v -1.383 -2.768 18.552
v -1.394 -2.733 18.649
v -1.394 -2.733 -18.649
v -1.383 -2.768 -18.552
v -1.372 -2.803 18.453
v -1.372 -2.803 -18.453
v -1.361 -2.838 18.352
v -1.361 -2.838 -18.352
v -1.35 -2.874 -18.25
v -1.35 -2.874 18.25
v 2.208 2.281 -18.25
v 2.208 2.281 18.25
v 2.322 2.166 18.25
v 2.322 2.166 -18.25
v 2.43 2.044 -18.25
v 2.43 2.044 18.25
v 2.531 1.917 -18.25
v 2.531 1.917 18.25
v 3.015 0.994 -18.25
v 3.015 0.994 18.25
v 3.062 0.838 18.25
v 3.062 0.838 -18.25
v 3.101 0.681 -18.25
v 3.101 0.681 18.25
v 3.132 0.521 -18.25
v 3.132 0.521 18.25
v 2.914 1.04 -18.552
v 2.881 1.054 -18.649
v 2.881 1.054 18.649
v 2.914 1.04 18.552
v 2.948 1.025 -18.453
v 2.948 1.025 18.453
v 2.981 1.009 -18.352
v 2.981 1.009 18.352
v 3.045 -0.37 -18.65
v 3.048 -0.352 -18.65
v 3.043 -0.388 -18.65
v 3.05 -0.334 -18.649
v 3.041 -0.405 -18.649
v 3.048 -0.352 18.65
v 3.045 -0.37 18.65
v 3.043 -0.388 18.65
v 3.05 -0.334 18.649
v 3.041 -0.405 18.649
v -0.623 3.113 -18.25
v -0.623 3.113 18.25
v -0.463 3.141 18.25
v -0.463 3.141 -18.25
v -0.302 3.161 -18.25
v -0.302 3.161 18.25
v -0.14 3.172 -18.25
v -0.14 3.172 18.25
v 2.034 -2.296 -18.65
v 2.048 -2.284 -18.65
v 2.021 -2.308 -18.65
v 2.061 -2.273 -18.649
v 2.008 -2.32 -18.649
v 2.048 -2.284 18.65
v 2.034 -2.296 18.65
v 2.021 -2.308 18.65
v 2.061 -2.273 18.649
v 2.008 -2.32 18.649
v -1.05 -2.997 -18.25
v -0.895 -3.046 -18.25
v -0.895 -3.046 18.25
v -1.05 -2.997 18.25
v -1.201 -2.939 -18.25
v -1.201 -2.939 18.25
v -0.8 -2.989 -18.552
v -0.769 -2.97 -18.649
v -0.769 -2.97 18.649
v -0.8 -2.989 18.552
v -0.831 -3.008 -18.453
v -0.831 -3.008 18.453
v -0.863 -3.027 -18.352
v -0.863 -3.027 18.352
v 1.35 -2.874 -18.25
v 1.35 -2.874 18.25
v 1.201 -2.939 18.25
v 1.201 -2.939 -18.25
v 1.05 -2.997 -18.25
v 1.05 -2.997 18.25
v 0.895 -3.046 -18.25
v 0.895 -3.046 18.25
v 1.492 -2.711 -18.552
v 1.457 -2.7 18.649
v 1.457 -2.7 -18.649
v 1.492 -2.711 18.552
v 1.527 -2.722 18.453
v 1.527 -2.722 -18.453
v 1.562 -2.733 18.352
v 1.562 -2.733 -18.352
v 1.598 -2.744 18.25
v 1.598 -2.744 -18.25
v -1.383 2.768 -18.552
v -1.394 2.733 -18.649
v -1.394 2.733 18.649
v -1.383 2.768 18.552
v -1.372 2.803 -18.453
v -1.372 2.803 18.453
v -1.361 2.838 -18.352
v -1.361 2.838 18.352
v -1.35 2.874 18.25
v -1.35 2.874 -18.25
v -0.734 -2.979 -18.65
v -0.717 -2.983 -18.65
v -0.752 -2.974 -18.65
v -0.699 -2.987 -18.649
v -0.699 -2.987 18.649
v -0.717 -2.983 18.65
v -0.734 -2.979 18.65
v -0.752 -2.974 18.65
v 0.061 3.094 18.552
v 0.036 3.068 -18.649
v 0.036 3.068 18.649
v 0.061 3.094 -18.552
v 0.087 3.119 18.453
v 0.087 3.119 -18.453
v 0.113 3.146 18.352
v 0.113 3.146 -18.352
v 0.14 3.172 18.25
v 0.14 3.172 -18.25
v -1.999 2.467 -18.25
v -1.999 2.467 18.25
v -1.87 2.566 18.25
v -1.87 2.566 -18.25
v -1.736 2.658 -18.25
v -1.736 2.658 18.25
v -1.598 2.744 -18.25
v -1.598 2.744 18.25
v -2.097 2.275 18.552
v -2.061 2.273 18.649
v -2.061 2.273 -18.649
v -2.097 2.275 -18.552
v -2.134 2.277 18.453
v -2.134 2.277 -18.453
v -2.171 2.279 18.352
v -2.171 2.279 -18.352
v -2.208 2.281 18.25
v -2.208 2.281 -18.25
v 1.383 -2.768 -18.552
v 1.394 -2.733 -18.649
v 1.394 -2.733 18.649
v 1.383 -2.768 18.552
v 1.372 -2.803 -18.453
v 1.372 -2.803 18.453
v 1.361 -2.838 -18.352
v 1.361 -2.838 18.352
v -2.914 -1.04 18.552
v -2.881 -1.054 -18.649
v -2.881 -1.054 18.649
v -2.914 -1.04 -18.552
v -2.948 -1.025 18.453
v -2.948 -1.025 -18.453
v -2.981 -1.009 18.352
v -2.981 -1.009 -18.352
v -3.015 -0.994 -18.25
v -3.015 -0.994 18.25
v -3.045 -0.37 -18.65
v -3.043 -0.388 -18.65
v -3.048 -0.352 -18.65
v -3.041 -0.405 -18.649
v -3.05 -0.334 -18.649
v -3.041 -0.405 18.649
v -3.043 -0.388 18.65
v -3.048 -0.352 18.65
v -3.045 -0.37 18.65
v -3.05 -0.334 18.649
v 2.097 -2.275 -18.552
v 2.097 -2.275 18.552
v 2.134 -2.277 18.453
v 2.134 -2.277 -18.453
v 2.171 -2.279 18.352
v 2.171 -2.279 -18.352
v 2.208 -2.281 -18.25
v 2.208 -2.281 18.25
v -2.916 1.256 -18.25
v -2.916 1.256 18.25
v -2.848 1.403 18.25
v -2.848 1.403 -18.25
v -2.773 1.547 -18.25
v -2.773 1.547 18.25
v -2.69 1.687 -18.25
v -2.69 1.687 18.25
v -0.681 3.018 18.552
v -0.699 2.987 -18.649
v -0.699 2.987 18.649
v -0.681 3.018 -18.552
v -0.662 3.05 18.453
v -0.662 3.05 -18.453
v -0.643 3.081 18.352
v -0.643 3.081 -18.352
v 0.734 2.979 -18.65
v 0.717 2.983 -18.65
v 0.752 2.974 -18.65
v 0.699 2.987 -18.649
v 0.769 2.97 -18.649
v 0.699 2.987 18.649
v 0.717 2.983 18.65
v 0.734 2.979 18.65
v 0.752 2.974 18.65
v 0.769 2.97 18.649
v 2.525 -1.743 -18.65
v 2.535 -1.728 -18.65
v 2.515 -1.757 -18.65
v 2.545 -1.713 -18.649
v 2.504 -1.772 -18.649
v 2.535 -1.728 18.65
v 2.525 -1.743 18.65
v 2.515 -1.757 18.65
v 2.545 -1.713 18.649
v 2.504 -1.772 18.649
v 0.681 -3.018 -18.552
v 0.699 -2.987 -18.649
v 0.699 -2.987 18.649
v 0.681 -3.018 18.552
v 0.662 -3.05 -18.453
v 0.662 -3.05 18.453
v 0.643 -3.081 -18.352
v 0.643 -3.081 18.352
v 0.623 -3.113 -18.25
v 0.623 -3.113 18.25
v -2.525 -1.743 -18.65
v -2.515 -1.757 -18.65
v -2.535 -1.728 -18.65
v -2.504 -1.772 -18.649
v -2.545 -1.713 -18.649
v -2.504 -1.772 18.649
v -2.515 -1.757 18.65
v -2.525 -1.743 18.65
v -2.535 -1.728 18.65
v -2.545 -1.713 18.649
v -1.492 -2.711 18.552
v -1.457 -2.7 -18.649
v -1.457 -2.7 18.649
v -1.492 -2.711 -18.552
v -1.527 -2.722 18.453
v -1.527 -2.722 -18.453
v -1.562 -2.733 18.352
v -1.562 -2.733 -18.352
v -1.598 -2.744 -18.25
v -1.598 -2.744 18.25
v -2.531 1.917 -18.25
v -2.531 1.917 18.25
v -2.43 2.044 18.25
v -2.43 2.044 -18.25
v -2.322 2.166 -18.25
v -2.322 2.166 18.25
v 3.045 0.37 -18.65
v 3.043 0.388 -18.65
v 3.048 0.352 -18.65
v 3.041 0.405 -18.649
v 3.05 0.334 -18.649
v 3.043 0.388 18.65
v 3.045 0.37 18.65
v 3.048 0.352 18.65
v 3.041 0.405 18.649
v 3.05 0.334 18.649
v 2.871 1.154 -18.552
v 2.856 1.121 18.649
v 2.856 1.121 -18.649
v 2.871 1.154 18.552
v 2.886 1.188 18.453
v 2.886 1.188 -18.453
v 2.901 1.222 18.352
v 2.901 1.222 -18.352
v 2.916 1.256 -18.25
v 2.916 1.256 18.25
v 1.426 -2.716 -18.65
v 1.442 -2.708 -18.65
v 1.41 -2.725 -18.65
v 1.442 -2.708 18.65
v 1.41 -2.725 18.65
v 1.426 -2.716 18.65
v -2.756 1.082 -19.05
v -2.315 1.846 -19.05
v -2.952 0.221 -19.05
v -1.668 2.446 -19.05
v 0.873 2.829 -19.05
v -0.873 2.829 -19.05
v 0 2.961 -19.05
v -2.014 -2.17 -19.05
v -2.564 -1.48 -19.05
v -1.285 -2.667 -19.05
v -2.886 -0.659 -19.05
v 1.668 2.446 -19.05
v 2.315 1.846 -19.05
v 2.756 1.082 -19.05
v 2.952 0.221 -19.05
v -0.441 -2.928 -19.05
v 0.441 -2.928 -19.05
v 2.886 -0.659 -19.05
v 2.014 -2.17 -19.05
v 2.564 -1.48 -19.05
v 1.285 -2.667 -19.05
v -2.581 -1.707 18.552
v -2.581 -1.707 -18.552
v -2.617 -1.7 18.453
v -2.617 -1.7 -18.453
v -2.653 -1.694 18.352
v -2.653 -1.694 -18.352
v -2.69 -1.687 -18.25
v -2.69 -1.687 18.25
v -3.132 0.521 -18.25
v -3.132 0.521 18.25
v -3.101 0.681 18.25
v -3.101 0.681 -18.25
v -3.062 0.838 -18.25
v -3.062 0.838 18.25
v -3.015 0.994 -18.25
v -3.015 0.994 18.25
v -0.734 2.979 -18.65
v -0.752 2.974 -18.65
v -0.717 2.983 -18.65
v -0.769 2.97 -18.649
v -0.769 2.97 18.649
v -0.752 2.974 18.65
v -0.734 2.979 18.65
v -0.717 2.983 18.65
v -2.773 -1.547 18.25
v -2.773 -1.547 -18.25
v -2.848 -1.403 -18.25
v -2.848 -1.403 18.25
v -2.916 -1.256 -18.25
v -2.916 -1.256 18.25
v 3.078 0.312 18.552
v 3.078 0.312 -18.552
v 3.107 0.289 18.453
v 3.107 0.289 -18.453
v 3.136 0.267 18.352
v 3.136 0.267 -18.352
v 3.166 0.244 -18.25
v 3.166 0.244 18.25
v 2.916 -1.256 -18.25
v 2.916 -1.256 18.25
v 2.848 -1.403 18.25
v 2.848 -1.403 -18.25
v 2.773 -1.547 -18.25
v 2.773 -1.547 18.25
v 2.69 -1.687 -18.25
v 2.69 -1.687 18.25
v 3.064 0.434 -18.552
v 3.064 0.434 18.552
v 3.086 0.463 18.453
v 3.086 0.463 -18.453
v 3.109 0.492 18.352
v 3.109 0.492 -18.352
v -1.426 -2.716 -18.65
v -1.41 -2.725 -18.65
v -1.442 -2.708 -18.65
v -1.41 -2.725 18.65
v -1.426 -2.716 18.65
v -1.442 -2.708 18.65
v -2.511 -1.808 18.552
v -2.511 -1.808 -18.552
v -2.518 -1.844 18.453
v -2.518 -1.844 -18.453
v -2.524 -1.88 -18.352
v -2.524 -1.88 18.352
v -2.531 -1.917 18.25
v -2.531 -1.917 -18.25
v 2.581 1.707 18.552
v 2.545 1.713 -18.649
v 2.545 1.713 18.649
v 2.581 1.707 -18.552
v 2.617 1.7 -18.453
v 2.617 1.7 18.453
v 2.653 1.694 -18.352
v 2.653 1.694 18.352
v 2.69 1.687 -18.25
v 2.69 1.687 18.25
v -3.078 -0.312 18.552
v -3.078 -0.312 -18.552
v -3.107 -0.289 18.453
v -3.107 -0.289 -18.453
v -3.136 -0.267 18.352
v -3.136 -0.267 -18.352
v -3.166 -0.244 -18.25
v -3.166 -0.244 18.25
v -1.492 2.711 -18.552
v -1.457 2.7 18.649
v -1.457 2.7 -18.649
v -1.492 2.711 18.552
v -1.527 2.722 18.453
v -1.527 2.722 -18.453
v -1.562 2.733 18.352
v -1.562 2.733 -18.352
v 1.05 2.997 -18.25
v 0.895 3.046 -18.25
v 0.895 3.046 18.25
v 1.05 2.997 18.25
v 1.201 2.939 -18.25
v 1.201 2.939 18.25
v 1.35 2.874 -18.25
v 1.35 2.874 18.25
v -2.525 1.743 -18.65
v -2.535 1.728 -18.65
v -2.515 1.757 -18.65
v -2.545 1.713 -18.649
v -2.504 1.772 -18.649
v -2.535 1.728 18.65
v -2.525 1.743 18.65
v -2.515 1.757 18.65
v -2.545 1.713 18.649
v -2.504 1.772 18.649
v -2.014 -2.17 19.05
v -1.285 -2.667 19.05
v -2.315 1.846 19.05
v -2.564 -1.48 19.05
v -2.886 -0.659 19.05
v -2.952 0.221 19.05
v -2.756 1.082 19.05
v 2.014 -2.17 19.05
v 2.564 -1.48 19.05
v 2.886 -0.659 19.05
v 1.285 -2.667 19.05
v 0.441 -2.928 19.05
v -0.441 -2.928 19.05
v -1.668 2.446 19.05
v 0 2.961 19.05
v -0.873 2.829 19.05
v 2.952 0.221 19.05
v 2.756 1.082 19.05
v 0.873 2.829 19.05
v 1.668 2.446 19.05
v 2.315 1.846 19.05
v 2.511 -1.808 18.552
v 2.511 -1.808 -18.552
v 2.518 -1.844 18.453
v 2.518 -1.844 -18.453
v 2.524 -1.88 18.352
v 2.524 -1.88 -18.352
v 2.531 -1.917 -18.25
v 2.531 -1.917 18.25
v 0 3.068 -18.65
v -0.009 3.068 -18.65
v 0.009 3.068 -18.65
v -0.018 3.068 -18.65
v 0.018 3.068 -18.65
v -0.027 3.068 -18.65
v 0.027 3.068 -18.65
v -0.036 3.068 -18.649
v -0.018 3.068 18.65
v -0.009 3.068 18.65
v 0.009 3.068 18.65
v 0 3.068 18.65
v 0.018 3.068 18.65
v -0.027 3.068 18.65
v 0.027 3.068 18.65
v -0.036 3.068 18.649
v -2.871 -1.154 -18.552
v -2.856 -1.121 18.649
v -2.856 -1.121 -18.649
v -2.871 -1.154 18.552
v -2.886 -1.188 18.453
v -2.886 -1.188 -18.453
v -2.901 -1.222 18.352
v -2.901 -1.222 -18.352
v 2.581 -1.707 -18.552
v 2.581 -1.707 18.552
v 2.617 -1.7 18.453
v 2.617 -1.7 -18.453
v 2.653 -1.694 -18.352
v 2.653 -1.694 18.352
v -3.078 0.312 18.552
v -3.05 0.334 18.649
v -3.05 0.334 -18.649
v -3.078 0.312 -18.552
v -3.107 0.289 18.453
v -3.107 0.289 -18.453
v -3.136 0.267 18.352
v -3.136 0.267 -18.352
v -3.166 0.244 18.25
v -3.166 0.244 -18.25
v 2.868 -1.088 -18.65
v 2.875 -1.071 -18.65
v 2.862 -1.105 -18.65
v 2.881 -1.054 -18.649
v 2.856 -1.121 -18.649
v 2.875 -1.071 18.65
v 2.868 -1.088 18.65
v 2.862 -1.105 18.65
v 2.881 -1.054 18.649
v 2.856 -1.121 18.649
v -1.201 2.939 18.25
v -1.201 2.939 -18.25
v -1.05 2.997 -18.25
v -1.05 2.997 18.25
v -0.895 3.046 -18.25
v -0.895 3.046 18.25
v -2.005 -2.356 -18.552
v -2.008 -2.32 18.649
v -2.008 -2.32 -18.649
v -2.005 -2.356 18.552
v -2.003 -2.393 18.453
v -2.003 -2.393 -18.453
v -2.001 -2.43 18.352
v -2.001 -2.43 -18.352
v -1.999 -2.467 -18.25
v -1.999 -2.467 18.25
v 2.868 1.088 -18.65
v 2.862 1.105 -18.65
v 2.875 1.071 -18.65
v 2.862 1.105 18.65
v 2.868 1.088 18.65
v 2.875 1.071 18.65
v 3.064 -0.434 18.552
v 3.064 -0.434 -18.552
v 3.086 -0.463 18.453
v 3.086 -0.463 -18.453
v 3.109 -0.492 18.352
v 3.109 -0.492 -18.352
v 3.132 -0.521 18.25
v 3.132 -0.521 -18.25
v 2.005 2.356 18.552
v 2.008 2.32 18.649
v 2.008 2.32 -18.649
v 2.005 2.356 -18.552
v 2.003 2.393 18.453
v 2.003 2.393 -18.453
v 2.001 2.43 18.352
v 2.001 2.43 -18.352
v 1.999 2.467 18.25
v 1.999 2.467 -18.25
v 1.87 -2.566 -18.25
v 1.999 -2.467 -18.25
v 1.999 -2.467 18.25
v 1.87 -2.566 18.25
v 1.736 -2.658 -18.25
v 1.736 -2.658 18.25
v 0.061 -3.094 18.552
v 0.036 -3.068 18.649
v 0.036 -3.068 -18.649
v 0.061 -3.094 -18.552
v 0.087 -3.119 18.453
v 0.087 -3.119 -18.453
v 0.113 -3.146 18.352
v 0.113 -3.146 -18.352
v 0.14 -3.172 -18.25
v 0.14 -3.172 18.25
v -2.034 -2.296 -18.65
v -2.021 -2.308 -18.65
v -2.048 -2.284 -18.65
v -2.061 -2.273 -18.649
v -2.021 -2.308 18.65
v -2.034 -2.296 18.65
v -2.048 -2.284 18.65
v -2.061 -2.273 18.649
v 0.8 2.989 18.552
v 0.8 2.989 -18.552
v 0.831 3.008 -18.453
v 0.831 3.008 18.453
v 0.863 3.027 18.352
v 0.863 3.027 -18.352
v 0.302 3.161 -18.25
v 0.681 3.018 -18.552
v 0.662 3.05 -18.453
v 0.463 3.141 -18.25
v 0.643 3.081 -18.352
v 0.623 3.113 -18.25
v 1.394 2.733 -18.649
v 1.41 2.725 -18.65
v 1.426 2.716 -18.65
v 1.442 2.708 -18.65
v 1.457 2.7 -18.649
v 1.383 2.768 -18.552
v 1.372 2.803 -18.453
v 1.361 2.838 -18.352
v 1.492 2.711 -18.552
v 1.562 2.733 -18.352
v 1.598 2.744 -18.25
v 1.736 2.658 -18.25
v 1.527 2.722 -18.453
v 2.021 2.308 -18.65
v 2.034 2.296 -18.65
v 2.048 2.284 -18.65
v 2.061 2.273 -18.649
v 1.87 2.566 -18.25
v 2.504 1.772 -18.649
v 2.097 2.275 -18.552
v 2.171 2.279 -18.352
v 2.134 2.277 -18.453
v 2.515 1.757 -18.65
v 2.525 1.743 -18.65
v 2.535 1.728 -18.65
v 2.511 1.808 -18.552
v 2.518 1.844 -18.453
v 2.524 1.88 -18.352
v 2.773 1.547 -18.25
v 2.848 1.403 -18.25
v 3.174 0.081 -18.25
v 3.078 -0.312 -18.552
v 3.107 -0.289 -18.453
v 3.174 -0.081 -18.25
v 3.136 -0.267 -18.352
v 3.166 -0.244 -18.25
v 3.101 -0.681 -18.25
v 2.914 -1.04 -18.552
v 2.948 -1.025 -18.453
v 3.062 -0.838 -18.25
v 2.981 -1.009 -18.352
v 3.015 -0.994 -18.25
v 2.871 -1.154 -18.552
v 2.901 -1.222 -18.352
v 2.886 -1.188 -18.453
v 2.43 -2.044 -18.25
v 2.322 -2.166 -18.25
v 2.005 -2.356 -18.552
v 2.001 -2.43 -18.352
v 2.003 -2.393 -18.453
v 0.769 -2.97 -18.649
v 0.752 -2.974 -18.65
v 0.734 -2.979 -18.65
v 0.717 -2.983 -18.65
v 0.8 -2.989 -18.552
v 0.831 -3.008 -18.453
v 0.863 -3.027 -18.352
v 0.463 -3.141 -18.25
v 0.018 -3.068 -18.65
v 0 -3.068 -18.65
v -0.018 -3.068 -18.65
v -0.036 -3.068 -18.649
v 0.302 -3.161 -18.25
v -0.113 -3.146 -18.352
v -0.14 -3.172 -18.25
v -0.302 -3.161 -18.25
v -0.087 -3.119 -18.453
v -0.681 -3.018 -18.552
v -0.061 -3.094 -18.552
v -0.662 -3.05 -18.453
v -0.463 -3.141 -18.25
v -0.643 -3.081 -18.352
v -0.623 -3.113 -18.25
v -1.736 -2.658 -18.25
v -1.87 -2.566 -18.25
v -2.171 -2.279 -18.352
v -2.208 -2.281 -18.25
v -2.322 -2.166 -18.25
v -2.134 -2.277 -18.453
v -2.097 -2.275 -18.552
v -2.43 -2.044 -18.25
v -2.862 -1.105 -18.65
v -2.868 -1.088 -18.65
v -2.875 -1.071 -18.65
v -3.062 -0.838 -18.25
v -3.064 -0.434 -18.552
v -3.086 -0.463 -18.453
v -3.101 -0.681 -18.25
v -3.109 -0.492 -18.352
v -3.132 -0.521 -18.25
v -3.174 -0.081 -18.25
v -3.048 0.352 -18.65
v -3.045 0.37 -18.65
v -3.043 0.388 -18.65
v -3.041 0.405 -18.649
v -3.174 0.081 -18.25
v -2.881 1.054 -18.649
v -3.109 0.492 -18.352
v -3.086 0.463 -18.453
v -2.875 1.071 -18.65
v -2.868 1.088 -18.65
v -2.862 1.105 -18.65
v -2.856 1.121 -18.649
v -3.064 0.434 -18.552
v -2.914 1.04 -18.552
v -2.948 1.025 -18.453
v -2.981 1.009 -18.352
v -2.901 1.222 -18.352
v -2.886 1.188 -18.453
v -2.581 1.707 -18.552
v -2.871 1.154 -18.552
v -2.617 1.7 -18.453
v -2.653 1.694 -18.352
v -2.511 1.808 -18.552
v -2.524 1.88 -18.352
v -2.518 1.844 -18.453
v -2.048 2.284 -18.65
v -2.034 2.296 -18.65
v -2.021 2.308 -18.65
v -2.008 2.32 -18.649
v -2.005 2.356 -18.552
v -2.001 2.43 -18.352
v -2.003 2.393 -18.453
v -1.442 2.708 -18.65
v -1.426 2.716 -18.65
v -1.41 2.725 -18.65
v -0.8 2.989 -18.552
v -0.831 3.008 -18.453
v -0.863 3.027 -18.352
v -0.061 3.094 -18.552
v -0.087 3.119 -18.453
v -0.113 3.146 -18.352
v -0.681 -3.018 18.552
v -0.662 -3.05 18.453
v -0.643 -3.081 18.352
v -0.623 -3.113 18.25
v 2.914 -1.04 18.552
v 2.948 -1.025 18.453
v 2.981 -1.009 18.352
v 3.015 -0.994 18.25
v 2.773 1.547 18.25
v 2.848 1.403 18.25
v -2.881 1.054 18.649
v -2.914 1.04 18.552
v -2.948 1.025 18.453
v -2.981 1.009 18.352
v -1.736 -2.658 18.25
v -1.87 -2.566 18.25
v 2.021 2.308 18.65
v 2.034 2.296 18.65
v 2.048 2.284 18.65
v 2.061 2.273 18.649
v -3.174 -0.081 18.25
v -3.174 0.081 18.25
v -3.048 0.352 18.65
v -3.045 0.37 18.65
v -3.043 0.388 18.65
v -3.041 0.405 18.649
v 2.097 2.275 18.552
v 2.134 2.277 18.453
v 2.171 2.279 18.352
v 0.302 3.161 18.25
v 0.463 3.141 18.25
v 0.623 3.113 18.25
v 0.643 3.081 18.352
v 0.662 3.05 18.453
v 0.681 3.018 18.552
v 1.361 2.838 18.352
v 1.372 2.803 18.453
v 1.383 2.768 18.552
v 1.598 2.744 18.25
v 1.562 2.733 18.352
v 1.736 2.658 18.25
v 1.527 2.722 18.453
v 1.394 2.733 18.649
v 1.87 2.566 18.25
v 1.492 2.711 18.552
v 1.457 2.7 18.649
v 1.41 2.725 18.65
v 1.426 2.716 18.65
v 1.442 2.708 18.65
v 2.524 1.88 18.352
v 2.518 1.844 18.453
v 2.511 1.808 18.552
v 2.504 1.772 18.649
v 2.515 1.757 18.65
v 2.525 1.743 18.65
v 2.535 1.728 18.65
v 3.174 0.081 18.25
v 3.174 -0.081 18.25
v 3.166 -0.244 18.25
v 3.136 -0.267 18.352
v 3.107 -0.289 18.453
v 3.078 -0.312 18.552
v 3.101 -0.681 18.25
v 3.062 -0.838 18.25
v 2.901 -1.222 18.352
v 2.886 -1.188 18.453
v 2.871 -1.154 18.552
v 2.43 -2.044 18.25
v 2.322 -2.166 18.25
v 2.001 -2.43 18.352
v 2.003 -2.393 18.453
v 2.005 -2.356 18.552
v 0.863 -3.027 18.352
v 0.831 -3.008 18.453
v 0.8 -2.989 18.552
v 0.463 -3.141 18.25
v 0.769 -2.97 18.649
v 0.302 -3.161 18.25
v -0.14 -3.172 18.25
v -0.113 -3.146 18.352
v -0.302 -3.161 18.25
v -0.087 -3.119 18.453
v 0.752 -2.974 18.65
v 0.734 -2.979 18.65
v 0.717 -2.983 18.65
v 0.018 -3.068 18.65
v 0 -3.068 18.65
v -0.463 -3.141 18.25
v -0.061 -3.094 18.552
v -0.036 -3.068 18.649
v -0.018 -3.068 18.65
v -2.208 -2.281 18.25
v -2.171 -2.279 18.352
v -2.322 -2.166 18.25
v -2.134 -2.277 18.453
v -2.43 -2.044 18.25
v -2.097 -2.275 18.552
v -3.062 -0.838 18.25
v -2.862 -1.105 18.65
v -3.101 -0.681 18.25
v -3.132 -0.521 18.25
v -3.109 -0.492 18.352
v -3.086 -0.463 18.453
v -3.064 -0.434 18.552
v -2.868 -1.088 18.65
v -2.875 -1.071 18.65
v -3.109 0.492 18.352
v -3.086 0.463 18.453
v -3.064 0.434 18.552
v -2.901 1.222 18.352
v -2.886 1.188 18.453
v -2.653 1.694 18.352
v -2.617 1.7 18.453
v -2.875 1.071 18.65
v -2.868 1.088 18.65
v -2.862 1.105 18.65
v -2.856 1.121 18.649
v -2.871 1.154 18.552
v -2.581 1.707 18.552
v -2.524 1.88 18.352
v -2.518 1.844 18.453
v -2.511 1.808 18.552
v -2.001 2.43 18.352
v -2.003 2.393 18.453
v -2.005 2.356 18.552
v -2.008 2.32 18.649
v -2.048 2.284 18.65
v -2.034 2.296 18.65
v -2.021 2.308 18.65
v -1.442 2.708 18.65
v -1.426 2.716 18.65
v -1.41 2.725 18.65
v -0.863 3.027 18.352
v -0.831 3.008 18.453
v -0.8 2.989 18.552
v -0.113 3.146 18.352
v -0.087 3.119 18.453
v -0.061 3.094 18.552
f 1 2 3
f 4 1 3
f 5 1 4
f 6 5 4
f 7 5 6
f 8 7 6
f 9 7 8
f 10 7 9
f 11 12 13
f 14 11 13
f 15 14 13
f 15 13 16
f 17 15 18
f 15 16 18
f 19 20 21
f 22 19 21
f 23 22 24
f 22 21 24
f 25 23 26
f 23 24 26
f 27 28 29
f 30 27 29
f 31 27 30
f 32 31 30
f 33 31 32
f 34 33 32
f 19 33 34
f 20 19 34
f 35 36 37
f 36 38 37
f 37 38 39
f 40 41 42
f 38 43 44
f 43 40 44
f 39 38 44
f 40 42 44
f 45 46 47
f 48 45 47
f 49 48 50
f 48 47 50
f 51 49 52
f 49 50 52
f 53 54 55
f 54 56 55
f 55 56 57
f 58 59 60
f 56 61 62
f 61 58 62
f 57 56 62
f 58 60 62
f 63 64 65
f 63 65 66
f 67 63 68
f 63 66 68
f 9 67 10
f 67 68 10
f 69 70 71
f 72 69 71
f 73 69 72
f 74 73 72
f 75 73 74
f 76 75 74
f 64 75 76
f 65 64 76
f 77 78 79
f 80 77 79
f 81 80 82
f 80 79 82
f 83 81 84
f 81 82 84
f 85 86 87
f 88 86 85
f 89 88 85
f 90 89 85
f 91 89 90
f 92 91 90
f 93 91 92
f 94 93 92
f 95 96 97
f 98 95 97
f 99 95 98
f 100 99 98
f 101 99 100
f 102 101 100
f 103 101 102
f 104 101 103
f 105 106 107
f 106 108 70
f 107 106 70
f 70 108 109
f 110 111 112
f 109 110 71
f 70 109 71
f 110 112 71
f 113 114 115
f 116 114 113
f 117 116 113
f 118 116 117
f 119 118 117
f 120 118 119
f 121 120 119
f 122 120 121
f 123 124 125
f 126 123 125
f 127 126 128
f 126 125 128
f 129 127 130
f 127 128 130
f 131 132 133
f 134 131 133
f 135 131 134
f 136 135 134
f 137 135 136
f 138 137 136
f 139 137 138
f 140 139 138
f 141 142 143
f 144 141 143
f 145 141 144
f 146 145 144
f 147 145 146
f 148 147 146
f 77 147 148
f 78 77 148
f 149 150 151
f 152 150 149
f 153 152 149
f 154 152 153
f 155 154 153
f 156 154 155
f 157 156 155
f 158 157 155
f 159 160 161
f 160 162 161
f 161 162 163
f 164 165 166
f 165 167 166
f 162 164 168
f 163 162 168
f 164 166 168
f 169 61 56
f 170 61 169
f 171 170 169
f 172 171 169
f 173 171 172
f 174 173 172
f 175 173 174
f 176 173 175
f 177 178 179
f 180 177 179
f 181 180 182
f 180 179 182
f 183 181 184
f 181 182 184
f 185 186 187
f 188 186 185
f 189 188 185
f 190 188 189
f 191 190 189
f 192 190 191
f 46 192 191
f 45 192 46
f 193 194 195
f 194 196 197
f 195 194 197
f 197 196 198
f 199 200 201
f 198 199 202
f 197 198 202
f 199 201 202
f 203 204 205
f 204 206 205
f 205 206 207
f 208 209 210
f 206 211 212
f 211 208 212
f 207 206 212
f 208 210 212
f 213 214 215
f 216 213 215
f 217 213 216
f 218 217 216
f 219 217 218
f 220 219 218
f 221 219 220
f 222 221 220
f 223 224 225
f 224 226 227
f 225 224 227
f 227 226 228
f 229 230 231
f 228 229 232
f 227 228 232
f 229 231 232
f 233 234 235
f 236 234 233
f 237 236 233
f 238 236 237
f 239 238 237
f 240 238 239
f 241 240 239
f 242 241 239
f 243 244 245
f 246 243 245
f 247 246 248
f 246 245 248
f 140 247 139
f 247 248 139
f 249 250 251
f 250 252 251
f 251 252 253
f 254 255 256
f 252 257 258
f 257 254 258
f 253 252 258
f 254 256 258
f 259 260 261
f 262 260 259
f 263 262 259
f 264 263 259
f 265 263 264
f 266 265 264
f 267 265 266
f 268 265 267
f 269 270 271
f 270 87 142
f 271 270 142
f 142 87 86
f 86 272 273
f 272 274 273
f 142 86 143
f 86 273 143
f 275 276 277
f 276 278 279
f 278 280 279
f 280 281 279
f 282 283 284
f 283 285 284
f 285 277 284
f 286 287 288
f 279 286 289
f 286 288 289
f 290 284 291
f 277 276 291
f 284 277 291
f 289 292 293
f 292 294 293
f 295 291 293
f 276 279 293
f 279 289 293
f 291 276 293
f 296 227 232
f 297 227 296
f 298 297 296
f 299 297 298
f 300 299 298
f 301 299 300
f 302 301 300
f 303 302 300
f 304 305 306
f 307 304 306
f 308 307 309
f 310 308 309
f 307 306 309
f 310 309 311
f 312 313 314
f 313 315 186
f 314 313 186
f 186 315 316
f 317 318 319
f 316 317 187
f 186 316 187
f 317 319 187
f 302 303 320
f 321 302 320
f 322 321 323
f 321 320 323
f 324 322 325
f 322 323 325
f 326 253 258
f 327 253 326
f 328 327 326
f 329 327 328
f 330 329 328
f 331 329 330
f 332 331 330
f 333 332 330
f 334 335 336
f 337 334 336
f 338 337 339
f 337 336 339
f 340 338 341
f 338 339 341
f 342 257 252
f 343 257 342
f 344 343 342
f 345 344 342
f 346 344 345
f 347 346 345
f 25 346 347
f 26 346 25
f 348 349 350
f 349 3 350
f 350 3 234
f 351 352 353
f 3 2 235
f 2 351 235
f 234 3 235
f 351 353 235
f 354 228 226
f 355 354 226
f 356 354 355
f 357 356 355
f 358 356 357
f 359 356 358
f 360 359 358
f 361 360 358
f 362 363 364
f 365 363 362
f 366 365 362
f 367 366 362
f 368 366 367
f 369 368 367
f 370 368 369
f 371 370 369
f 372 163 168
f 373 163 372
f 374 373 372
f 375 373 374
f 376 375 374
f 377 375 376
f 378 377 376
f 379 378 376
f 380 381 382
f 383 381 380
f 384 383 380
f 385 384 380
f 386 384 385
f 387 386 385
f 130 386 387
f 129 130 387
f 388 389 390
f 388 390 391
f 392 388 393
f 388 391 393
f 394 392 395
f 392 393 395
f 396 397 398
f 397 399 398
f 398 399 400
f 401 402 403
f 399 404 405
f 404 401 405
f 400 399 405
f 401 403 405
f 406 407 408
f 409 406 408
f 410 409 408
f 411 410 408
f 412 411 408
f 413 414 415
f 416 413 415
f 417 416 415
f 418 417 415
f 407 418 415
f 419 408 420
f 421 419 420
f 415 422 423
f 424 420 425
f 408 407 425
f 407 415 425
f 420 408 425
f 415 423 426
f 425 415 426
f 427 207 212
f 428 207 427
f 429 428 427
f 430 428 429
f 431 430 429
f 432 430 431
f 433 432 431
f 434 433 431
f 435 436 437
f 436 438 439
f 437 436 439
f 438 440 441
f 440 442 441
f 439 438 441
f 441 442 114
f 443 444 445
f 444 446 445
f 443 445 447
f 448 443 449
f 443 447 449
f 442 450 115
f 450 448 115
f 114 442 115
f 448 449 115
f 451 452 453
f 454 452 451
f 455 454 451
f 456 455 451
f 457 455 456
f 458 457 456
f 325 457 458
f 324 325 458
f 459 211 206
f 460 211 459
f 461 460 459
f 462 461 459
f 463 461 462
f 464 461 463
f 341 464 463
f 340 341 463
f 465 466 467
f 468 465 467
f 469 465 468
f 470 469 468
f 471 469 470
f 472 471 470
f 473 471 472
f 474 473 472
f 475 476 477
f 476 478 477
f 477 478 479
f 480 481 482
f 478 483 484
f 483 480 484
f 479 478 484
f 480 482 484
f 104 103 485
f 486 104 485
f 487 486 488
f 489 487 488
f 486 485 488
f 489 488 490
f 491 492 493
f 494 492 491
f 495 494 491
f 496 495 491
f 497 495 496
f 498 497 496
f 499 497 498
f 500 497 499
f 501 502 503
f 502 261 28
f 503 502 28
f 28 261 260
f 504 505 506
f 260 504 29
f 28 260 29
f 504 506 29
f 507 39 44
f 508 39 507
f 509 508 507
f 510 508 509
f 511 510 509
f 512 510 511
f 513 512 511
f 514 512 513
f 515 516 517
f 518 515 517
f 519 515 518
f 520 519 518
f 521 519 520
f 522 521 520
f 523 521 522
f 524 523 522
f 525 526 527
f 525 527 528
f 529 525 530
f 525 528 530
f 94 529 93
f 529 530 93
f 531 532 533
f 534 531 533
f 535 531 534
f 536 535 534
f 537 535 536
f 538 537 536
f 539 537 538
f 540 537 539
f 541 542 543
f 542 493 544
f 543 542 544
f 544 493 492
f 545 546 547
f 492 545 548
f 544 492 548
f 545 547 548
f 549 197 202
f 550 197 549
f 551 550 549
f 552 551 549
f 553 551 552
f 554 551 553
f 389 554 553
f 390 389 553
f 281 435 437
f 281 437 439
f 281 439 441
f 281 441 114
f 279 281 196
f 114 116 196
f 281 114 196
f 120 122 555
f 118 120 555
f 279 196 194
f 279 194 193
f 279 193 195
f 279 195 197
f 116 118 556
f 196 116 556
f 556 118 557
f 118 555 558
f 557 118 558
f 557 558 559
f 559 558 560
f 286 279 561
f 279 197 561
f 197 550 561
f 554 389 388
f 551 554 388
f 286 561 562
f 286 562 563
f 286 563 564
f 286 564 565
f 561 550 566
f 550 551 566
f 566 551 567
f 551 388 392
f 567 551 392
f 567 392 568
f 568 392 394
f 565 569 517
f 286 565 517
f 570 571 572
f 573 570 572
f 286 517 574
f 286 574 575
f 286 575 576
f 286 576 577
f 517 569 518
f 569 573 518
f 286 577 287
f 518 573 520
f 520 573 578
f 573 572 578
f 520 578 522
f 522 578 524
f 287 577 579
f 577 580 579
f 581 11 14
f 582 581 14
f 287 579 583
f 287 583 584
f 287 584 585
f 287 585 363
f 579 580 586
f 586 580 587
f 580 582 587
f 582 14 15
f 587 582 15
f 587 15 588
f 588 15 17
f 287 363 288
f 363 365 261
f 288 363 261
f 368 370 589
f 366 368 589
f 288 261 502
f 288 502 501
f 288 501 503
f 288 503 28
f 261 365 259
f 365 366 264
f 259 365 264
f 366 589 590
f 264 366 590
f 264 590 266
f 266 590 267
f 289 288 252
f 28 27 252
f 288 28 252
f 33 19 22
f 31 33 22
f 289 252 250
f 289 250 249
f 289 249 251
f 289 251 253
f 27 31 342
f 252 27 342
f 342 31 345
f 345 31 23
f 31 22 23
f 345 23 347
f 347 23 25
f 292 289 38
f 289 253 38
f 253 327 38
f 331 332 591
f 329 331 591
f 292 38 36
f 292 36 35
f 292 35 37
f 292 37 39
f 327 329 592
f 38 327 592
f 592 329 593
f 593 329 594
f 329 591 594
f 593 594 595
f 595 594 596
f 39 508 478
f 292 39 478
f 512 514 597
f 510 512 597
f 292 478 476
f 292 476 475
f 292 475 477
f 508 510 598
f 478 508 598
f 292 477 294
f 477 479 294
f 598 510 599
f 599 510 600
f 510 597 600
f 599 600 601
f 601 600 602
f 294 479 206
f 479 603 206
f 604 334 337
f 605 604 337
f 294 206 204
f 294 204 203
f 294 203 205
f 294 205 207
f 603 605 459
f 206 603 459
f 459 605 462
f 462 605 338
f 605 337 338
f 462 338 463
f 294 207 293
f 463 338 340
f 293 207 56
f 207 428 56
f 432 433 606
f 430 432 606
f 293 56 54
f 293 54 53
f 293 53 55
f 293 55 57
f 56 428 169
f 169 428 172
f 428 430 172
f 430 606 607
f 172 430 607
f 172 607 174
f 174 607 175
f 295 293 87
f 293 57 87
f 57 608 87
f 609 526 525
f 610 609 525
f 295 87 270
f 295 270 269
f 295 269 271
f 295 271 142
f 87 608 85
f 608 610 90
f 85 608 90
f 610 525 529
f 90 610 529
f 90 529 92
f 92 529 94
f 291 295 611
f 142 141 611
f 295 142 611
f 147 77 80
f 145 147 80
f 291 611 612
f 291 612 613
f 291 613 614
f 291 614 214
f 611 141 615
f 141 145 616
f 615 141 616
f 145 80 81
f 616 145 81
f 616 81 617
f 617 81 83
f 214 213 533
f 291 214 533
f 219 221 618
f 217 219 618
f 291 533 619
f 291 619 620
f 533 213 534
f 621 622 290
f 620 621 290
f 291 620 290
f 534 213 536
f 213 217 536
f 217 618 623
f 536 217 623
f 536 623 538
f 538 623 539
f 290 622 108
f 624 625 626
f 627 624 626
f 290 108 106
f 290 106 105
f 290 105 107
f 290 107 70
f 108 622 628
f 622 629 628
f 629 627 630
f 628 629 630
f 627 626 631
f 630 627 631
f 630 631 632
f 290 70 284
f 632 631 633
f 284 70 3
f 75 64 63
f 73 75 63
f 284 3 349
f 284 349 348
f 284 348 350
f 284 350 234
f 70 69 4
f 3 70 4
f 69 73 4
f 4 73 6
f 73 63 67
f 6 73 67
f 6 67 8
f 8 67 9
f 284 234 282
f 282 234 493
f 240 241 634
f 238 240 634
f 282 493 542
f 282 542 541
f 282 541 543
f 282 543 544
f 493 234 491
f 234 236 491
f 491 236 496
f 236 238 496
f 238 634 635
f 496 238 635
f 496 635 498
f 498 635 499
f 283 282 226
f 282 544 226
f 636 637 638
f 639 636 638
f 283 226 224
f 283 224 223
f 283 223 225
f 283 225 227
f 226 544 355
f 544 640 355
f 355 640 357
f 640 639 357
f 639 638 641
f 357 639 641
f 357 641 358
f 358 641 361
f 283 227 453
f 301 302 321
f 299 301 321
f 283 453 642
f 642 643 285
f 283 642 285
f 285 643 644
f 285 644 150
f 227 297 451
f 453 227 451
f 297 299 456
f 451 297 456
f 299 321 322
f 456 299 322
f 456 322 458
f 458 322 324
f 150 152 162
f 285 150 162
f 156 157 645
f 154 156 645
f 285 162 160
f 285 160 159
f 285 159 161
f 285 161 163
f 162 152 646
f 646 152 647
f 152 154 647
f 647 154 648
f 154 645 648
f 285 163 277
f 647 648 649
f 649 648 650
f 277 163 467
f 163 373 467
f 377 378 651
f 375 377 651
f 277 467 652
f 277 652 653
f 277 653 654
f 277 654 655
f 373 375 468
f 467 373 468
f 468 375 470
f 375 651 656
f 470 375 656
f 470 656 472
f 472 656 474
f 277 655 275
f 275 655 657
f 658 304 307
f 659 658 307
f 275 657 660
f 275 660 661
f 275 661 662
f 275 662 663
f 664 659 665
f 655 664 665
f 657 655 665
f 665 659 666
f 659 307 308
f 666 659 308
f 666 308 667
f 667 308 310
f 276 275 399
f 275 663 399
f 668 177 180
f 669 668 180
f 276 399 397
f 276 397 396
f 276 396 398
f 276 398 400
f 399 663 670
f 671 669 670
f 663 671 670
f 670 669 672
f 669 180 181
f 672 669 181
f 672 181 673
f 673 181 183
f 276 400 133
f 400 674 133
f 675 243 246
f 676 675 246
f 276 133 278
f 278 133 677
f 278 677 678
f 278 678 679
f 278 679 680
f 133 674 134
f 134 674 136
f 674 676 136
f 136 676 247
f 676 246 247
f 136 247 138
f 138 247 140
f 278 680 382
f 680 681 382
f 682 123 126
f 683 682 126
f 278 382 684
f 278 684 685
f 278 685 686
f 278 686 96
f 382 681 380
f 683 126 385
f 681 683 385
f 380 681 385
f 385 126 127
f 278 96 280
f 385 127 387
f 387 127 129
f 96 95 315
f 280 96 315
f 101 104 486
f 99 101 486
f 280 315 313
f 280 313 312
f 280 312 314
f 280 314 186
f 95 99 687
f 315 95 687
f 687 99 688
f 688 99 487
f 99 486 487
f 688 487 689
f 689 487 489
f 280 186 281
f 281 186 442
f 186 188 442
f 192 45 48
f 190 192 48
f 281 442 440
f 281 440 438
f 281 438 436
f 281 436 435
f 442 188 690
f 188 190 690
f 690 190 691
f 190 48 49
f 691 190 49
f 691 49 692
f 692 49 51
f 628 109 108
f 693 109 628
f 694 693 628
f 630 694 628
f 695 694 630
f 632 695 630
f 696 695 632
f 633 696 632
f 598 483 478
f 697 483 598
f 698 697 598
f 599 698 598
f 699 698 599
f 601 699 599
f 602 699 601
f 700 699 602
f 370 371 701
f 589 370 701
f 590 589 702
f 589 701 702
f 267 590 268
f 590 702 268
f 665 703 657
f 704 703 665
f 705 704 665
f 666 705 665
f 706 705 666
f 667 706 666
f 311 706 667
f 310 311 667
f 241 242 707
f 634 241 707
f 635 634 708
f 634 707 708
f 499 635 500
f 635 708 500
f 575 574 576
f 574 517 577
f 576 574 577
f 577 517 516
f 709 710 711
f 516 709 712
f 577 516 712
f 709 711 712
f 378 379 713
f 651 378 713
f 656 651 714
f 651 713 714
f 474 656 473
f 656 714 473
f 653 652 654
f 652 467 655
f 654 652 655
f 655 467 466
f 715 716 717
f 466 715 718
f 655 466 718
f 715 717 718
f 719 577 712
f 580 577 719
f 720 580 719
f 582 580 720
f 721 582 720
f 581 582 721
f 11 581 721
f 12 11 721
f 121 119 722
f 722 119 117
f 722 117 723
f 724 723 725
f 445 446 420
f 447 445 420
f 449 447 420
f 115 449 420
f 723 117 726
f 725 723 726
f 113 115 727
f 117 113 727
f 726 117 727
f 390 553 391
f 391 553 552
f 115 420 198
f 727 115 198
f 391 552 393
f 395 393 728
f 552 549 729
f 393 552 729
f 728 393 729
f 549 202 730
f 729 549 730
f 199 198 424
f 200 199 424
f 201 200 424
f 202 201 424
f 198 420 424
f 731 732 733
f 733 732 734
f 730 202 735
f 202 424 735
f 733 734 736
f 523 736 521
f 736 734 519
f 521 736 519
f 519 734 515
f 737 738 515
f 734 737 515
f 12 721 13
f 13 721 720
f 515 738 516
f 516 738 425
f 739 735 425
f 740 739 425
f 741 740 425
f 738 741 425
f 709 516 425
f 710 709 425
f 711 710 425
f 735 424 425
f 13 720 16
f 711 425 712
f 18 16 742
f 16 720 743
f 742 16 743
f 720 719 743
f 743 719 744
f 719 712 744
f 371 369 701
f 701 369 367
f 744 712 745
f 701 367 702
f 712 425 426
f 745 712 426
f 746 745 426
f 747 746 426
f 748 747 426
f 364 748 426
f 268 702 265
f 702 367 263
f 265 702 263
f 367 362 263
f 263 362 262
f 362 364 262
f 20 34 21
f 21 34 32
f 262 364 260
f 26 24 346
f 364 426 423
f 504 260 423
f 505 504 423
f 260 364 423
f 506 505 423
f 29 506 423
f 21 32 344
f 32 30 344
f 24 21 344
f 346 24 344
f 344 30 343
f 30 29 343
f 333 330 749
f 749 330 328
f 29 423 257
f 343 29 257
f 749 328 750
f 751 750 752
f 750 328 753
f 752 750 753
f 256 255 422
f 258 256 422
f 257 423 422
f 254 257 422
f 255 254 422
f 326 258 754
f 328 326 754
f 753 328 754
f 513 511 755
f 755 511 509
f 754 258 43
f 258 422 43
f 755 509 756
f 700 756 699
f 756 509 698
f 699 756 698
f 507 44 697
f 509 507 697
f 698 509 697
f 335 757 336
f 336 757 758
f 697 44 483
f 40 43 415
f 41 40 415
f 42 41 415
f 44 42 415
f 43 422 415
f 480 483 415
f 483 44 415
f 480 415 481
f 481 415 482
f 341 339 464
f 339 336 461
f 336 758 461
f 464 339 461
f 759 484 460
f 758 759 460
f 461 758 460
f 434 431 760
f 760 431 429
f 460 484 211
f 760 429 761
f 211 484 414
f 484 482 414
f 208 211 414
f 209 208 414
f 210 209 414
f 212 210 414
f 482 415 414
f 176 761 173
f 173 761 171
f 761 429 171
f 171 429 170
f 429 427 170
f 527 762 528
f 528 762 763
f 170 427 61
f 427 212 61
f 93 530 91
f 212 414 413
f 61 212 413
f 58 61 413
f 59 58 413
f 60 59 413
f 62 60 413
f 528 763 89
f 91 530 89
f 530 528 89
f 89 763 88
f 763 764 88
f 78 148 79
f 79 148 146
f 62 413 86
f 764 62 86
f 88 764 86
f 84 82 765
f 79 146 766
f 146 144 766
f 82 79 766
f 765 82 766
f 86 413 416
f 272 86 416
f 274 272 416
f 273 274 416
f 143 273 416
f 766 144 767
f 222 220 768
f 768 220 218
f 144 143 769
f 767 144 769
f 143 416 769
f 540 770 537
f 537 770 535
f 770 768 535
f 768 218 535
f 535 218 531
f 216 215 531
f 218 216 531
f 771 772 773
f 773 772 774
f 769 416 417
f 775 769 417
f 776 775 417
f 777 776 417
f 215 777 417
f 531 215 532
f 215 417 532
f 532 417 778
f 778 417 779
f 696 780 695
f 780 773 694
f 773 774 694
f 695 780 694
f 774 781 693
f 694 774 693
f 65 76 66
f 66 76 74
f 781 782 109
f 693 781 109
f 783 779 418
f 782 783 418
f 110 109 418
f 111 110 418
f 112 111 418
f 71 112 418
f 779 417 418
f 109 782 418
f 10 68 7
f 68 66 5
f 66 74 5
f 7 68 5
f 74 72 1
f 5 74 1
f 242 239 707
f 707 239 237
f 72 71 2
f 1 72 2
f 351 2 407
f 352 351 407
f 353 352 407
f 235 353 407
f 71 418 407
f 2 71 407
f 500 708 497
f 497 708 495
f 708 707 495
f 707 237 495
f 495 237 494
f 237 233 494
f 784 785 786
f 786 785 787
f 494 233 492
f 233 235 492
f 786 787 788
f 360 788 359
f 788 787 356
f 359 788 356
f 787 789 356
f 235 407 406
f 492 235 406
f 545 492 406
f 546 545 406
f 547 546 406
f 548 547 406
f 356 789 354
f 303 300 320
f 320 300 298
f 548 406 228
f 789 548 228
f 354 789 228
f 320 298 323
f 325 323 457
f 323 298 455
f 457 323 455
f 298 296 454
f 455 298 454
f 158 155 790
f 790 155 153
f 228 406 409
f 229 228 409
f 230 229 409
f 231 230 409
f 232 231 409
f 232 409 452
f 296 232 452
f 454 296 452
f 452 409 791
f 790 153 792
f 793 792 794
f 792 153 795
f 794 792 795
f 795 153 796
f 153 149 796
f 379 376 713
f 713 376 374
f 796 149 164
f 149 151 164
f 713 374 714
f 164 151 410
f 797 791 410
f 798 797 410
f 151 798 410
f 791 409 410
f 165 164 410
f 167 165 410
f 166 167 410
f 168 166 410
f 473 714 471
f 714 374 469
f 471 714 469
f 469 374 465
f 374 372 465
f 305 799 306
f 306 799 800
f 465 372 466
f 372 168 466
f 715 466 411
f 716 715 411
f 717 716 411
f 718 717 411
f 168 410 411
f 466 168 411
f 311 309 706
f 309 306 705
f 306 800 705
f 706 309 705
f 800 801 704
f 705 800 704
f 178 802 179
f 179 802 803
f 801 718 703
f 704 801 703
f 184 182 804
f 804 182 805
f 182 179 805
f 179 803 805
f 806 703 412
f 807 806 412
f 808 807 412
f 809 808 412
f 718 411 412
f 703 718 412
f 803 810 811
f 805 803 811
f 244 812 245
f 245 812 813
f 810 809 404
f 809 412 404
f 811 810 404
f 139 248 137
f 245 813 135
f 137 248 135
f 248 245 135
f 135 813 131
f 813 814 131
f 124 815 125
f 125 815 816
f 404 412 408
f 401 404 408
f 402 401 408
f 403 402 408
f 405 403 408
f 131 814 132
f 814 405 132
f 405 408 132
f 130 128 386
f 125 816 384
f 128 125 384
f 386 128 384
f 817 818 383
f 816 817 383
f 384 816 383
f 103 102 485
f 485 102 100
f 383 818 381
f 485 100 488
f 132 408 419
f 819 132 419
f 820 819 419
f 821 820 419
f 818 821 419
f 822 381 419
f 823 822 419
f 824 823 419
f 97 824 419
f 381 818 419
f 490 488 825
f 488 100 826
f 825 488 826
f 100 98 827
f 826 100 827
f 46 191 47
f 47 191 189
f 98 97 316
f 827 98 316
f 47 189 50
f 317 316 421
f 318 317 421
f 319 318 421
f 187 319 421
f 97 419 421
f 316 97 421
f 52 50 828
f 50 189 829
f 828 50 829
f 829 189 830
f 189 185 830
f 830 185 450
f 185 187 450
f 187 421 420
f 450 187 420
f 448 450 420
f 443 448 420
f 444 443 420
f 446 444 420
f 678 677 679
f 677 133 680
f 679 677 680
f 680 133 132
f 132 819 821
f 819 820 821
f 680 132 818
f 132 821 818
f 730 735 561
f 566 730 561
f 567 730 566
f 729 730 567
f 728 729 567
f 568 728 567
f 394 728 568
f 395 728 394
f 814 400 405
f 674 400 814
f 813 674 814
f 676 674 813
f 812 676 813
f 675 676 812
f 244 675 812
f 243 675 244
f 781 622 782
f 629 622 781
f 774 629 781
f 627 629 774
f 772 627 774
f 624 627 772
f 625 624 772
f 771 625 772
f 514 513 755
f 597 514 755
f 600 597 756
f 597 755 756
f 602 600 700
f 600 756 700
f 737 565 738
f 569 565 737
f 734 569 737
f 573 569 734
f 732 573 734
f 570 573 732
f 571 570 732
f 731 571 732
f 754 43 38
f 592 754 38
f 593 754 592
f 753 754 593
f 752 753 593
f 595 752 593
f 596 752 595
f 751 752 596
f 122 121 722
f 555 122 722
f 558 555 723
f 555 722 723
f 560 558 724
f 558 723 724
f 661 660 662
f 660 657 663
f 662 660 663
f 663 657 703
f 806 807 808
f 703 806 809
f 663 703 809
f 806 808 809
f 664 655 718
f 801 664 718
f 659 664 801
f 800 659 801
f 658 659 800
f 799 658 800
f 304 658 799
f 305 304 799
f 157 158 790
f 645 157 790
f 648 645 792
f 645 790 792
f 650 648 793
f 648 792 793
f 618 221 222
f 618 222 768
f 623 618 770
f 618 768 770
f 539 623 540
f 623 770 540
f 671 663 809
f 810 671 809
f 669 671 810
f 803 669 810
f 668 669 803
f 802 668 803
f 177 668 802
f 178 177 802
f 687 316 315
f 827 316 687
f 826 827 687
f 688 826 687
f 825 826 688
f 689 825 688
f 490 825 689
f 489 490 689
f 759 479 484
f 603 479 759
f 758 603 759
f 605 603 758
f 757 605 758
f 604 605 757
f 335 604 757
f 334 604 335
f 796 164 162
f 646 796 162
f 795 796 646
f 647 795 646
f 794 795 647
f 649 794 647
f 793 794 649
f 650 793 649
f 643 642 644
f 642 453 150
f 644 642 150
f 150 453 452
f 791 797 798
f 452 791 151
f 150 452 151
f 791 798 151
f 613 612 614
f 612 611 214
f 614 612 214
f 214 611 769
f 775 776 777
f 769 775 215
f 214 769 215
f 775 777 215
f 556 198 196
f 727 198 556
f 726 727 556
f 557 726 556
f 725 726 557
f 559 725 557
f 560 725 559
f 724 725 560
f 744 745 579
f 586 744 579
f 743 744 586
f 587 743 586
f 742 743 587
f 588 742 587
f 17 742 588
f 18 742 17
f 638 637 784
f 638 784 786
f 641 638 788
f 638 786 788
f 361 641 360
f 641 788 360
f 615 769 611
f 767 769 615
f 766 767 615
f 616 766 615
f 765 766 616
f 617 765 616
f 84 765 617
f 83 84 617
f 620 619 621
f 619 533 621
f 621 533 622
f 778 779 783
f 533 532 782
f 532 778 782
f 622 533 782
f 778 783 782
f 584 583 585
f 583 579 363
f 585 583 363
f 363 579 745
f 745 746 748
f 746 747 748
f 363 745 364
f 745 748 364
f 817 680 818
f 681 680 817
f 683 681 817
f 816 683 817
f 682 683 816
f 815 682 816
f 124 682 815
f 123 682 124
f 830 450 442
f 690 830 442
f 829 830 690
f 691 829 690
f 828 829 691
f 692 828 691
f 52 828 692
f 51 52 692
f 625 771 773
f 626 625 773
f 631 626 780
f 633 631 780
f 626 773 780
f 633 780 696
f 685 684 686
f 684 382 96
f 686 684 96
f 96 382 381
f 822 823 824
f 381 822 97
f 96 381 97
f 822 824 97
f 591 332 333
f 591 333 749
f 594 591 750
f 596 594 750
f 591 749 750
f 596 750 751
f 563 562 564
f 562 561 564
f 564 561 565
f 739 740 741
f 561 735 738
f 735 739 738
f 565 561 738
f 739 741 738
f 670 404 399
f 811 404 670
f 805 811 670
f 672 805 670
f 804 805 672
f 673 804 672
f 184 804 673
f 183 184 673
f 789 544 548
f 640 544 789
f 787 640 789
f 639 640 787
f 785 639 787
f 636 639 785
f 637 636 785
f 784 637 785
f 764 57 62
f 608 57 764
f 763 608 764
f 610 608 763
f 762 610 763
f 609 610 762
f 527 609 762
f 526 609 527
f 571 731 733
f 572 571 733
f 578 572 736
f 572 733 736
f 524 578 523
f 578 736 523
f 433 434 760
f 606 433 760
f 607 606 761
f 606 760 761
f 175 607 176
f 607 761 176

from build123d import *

# Parameters (mm, degrees)
CUT_EXTRUDE1_DEPTH = 20.05
CIRPATTERN1_COUNT  = 26


with BuildPart() as part:
    # Sketch3 → Revolve1 (revolve)
    with BuildSketch(Plane(origin=(0, 0, 0), x_dir=(0, 0, -1), z_dir=(1, 0, 0))):
        Polygon((-19.05, 2.960640646), (-19.05, 0), (19.05, 0), (19.05, 2.960640646), (18.25, 3.175), (-18.25, 3.175), align=None)
    revolve(axis=Axis((0, 0, 19.05), (0, 0, -1)))

    # Sketch5 → Cut-Extrude1 (cut, symmetric)
    with BuildSketch(Plane.XY):
        Polygon((0.142906236, 3.175), (-0.142906236, 3.175), (-0.035726559, 3.067820323), (0.035726559, 3.067820323), align=None)
    cut_extrude1 = extrude(amount=CUT_EXTRUDE1_DEPTH, both=True, mode=Mode.SUBTRACT)

    # CirPattern1: Cut-Extrude1 ×26 about axis
    cirpattern1_axis = Axis((0, 0, 0), (0, 0, 1))
    for i in range(1, CIRPATTERN1_COUNT):
        add(cut_extrude1.rotate(cirpattern1_axis, i * 360 / CIRPATTERN1_COUNT), mode=Mode.SUBTRACT)


solid = part.part
